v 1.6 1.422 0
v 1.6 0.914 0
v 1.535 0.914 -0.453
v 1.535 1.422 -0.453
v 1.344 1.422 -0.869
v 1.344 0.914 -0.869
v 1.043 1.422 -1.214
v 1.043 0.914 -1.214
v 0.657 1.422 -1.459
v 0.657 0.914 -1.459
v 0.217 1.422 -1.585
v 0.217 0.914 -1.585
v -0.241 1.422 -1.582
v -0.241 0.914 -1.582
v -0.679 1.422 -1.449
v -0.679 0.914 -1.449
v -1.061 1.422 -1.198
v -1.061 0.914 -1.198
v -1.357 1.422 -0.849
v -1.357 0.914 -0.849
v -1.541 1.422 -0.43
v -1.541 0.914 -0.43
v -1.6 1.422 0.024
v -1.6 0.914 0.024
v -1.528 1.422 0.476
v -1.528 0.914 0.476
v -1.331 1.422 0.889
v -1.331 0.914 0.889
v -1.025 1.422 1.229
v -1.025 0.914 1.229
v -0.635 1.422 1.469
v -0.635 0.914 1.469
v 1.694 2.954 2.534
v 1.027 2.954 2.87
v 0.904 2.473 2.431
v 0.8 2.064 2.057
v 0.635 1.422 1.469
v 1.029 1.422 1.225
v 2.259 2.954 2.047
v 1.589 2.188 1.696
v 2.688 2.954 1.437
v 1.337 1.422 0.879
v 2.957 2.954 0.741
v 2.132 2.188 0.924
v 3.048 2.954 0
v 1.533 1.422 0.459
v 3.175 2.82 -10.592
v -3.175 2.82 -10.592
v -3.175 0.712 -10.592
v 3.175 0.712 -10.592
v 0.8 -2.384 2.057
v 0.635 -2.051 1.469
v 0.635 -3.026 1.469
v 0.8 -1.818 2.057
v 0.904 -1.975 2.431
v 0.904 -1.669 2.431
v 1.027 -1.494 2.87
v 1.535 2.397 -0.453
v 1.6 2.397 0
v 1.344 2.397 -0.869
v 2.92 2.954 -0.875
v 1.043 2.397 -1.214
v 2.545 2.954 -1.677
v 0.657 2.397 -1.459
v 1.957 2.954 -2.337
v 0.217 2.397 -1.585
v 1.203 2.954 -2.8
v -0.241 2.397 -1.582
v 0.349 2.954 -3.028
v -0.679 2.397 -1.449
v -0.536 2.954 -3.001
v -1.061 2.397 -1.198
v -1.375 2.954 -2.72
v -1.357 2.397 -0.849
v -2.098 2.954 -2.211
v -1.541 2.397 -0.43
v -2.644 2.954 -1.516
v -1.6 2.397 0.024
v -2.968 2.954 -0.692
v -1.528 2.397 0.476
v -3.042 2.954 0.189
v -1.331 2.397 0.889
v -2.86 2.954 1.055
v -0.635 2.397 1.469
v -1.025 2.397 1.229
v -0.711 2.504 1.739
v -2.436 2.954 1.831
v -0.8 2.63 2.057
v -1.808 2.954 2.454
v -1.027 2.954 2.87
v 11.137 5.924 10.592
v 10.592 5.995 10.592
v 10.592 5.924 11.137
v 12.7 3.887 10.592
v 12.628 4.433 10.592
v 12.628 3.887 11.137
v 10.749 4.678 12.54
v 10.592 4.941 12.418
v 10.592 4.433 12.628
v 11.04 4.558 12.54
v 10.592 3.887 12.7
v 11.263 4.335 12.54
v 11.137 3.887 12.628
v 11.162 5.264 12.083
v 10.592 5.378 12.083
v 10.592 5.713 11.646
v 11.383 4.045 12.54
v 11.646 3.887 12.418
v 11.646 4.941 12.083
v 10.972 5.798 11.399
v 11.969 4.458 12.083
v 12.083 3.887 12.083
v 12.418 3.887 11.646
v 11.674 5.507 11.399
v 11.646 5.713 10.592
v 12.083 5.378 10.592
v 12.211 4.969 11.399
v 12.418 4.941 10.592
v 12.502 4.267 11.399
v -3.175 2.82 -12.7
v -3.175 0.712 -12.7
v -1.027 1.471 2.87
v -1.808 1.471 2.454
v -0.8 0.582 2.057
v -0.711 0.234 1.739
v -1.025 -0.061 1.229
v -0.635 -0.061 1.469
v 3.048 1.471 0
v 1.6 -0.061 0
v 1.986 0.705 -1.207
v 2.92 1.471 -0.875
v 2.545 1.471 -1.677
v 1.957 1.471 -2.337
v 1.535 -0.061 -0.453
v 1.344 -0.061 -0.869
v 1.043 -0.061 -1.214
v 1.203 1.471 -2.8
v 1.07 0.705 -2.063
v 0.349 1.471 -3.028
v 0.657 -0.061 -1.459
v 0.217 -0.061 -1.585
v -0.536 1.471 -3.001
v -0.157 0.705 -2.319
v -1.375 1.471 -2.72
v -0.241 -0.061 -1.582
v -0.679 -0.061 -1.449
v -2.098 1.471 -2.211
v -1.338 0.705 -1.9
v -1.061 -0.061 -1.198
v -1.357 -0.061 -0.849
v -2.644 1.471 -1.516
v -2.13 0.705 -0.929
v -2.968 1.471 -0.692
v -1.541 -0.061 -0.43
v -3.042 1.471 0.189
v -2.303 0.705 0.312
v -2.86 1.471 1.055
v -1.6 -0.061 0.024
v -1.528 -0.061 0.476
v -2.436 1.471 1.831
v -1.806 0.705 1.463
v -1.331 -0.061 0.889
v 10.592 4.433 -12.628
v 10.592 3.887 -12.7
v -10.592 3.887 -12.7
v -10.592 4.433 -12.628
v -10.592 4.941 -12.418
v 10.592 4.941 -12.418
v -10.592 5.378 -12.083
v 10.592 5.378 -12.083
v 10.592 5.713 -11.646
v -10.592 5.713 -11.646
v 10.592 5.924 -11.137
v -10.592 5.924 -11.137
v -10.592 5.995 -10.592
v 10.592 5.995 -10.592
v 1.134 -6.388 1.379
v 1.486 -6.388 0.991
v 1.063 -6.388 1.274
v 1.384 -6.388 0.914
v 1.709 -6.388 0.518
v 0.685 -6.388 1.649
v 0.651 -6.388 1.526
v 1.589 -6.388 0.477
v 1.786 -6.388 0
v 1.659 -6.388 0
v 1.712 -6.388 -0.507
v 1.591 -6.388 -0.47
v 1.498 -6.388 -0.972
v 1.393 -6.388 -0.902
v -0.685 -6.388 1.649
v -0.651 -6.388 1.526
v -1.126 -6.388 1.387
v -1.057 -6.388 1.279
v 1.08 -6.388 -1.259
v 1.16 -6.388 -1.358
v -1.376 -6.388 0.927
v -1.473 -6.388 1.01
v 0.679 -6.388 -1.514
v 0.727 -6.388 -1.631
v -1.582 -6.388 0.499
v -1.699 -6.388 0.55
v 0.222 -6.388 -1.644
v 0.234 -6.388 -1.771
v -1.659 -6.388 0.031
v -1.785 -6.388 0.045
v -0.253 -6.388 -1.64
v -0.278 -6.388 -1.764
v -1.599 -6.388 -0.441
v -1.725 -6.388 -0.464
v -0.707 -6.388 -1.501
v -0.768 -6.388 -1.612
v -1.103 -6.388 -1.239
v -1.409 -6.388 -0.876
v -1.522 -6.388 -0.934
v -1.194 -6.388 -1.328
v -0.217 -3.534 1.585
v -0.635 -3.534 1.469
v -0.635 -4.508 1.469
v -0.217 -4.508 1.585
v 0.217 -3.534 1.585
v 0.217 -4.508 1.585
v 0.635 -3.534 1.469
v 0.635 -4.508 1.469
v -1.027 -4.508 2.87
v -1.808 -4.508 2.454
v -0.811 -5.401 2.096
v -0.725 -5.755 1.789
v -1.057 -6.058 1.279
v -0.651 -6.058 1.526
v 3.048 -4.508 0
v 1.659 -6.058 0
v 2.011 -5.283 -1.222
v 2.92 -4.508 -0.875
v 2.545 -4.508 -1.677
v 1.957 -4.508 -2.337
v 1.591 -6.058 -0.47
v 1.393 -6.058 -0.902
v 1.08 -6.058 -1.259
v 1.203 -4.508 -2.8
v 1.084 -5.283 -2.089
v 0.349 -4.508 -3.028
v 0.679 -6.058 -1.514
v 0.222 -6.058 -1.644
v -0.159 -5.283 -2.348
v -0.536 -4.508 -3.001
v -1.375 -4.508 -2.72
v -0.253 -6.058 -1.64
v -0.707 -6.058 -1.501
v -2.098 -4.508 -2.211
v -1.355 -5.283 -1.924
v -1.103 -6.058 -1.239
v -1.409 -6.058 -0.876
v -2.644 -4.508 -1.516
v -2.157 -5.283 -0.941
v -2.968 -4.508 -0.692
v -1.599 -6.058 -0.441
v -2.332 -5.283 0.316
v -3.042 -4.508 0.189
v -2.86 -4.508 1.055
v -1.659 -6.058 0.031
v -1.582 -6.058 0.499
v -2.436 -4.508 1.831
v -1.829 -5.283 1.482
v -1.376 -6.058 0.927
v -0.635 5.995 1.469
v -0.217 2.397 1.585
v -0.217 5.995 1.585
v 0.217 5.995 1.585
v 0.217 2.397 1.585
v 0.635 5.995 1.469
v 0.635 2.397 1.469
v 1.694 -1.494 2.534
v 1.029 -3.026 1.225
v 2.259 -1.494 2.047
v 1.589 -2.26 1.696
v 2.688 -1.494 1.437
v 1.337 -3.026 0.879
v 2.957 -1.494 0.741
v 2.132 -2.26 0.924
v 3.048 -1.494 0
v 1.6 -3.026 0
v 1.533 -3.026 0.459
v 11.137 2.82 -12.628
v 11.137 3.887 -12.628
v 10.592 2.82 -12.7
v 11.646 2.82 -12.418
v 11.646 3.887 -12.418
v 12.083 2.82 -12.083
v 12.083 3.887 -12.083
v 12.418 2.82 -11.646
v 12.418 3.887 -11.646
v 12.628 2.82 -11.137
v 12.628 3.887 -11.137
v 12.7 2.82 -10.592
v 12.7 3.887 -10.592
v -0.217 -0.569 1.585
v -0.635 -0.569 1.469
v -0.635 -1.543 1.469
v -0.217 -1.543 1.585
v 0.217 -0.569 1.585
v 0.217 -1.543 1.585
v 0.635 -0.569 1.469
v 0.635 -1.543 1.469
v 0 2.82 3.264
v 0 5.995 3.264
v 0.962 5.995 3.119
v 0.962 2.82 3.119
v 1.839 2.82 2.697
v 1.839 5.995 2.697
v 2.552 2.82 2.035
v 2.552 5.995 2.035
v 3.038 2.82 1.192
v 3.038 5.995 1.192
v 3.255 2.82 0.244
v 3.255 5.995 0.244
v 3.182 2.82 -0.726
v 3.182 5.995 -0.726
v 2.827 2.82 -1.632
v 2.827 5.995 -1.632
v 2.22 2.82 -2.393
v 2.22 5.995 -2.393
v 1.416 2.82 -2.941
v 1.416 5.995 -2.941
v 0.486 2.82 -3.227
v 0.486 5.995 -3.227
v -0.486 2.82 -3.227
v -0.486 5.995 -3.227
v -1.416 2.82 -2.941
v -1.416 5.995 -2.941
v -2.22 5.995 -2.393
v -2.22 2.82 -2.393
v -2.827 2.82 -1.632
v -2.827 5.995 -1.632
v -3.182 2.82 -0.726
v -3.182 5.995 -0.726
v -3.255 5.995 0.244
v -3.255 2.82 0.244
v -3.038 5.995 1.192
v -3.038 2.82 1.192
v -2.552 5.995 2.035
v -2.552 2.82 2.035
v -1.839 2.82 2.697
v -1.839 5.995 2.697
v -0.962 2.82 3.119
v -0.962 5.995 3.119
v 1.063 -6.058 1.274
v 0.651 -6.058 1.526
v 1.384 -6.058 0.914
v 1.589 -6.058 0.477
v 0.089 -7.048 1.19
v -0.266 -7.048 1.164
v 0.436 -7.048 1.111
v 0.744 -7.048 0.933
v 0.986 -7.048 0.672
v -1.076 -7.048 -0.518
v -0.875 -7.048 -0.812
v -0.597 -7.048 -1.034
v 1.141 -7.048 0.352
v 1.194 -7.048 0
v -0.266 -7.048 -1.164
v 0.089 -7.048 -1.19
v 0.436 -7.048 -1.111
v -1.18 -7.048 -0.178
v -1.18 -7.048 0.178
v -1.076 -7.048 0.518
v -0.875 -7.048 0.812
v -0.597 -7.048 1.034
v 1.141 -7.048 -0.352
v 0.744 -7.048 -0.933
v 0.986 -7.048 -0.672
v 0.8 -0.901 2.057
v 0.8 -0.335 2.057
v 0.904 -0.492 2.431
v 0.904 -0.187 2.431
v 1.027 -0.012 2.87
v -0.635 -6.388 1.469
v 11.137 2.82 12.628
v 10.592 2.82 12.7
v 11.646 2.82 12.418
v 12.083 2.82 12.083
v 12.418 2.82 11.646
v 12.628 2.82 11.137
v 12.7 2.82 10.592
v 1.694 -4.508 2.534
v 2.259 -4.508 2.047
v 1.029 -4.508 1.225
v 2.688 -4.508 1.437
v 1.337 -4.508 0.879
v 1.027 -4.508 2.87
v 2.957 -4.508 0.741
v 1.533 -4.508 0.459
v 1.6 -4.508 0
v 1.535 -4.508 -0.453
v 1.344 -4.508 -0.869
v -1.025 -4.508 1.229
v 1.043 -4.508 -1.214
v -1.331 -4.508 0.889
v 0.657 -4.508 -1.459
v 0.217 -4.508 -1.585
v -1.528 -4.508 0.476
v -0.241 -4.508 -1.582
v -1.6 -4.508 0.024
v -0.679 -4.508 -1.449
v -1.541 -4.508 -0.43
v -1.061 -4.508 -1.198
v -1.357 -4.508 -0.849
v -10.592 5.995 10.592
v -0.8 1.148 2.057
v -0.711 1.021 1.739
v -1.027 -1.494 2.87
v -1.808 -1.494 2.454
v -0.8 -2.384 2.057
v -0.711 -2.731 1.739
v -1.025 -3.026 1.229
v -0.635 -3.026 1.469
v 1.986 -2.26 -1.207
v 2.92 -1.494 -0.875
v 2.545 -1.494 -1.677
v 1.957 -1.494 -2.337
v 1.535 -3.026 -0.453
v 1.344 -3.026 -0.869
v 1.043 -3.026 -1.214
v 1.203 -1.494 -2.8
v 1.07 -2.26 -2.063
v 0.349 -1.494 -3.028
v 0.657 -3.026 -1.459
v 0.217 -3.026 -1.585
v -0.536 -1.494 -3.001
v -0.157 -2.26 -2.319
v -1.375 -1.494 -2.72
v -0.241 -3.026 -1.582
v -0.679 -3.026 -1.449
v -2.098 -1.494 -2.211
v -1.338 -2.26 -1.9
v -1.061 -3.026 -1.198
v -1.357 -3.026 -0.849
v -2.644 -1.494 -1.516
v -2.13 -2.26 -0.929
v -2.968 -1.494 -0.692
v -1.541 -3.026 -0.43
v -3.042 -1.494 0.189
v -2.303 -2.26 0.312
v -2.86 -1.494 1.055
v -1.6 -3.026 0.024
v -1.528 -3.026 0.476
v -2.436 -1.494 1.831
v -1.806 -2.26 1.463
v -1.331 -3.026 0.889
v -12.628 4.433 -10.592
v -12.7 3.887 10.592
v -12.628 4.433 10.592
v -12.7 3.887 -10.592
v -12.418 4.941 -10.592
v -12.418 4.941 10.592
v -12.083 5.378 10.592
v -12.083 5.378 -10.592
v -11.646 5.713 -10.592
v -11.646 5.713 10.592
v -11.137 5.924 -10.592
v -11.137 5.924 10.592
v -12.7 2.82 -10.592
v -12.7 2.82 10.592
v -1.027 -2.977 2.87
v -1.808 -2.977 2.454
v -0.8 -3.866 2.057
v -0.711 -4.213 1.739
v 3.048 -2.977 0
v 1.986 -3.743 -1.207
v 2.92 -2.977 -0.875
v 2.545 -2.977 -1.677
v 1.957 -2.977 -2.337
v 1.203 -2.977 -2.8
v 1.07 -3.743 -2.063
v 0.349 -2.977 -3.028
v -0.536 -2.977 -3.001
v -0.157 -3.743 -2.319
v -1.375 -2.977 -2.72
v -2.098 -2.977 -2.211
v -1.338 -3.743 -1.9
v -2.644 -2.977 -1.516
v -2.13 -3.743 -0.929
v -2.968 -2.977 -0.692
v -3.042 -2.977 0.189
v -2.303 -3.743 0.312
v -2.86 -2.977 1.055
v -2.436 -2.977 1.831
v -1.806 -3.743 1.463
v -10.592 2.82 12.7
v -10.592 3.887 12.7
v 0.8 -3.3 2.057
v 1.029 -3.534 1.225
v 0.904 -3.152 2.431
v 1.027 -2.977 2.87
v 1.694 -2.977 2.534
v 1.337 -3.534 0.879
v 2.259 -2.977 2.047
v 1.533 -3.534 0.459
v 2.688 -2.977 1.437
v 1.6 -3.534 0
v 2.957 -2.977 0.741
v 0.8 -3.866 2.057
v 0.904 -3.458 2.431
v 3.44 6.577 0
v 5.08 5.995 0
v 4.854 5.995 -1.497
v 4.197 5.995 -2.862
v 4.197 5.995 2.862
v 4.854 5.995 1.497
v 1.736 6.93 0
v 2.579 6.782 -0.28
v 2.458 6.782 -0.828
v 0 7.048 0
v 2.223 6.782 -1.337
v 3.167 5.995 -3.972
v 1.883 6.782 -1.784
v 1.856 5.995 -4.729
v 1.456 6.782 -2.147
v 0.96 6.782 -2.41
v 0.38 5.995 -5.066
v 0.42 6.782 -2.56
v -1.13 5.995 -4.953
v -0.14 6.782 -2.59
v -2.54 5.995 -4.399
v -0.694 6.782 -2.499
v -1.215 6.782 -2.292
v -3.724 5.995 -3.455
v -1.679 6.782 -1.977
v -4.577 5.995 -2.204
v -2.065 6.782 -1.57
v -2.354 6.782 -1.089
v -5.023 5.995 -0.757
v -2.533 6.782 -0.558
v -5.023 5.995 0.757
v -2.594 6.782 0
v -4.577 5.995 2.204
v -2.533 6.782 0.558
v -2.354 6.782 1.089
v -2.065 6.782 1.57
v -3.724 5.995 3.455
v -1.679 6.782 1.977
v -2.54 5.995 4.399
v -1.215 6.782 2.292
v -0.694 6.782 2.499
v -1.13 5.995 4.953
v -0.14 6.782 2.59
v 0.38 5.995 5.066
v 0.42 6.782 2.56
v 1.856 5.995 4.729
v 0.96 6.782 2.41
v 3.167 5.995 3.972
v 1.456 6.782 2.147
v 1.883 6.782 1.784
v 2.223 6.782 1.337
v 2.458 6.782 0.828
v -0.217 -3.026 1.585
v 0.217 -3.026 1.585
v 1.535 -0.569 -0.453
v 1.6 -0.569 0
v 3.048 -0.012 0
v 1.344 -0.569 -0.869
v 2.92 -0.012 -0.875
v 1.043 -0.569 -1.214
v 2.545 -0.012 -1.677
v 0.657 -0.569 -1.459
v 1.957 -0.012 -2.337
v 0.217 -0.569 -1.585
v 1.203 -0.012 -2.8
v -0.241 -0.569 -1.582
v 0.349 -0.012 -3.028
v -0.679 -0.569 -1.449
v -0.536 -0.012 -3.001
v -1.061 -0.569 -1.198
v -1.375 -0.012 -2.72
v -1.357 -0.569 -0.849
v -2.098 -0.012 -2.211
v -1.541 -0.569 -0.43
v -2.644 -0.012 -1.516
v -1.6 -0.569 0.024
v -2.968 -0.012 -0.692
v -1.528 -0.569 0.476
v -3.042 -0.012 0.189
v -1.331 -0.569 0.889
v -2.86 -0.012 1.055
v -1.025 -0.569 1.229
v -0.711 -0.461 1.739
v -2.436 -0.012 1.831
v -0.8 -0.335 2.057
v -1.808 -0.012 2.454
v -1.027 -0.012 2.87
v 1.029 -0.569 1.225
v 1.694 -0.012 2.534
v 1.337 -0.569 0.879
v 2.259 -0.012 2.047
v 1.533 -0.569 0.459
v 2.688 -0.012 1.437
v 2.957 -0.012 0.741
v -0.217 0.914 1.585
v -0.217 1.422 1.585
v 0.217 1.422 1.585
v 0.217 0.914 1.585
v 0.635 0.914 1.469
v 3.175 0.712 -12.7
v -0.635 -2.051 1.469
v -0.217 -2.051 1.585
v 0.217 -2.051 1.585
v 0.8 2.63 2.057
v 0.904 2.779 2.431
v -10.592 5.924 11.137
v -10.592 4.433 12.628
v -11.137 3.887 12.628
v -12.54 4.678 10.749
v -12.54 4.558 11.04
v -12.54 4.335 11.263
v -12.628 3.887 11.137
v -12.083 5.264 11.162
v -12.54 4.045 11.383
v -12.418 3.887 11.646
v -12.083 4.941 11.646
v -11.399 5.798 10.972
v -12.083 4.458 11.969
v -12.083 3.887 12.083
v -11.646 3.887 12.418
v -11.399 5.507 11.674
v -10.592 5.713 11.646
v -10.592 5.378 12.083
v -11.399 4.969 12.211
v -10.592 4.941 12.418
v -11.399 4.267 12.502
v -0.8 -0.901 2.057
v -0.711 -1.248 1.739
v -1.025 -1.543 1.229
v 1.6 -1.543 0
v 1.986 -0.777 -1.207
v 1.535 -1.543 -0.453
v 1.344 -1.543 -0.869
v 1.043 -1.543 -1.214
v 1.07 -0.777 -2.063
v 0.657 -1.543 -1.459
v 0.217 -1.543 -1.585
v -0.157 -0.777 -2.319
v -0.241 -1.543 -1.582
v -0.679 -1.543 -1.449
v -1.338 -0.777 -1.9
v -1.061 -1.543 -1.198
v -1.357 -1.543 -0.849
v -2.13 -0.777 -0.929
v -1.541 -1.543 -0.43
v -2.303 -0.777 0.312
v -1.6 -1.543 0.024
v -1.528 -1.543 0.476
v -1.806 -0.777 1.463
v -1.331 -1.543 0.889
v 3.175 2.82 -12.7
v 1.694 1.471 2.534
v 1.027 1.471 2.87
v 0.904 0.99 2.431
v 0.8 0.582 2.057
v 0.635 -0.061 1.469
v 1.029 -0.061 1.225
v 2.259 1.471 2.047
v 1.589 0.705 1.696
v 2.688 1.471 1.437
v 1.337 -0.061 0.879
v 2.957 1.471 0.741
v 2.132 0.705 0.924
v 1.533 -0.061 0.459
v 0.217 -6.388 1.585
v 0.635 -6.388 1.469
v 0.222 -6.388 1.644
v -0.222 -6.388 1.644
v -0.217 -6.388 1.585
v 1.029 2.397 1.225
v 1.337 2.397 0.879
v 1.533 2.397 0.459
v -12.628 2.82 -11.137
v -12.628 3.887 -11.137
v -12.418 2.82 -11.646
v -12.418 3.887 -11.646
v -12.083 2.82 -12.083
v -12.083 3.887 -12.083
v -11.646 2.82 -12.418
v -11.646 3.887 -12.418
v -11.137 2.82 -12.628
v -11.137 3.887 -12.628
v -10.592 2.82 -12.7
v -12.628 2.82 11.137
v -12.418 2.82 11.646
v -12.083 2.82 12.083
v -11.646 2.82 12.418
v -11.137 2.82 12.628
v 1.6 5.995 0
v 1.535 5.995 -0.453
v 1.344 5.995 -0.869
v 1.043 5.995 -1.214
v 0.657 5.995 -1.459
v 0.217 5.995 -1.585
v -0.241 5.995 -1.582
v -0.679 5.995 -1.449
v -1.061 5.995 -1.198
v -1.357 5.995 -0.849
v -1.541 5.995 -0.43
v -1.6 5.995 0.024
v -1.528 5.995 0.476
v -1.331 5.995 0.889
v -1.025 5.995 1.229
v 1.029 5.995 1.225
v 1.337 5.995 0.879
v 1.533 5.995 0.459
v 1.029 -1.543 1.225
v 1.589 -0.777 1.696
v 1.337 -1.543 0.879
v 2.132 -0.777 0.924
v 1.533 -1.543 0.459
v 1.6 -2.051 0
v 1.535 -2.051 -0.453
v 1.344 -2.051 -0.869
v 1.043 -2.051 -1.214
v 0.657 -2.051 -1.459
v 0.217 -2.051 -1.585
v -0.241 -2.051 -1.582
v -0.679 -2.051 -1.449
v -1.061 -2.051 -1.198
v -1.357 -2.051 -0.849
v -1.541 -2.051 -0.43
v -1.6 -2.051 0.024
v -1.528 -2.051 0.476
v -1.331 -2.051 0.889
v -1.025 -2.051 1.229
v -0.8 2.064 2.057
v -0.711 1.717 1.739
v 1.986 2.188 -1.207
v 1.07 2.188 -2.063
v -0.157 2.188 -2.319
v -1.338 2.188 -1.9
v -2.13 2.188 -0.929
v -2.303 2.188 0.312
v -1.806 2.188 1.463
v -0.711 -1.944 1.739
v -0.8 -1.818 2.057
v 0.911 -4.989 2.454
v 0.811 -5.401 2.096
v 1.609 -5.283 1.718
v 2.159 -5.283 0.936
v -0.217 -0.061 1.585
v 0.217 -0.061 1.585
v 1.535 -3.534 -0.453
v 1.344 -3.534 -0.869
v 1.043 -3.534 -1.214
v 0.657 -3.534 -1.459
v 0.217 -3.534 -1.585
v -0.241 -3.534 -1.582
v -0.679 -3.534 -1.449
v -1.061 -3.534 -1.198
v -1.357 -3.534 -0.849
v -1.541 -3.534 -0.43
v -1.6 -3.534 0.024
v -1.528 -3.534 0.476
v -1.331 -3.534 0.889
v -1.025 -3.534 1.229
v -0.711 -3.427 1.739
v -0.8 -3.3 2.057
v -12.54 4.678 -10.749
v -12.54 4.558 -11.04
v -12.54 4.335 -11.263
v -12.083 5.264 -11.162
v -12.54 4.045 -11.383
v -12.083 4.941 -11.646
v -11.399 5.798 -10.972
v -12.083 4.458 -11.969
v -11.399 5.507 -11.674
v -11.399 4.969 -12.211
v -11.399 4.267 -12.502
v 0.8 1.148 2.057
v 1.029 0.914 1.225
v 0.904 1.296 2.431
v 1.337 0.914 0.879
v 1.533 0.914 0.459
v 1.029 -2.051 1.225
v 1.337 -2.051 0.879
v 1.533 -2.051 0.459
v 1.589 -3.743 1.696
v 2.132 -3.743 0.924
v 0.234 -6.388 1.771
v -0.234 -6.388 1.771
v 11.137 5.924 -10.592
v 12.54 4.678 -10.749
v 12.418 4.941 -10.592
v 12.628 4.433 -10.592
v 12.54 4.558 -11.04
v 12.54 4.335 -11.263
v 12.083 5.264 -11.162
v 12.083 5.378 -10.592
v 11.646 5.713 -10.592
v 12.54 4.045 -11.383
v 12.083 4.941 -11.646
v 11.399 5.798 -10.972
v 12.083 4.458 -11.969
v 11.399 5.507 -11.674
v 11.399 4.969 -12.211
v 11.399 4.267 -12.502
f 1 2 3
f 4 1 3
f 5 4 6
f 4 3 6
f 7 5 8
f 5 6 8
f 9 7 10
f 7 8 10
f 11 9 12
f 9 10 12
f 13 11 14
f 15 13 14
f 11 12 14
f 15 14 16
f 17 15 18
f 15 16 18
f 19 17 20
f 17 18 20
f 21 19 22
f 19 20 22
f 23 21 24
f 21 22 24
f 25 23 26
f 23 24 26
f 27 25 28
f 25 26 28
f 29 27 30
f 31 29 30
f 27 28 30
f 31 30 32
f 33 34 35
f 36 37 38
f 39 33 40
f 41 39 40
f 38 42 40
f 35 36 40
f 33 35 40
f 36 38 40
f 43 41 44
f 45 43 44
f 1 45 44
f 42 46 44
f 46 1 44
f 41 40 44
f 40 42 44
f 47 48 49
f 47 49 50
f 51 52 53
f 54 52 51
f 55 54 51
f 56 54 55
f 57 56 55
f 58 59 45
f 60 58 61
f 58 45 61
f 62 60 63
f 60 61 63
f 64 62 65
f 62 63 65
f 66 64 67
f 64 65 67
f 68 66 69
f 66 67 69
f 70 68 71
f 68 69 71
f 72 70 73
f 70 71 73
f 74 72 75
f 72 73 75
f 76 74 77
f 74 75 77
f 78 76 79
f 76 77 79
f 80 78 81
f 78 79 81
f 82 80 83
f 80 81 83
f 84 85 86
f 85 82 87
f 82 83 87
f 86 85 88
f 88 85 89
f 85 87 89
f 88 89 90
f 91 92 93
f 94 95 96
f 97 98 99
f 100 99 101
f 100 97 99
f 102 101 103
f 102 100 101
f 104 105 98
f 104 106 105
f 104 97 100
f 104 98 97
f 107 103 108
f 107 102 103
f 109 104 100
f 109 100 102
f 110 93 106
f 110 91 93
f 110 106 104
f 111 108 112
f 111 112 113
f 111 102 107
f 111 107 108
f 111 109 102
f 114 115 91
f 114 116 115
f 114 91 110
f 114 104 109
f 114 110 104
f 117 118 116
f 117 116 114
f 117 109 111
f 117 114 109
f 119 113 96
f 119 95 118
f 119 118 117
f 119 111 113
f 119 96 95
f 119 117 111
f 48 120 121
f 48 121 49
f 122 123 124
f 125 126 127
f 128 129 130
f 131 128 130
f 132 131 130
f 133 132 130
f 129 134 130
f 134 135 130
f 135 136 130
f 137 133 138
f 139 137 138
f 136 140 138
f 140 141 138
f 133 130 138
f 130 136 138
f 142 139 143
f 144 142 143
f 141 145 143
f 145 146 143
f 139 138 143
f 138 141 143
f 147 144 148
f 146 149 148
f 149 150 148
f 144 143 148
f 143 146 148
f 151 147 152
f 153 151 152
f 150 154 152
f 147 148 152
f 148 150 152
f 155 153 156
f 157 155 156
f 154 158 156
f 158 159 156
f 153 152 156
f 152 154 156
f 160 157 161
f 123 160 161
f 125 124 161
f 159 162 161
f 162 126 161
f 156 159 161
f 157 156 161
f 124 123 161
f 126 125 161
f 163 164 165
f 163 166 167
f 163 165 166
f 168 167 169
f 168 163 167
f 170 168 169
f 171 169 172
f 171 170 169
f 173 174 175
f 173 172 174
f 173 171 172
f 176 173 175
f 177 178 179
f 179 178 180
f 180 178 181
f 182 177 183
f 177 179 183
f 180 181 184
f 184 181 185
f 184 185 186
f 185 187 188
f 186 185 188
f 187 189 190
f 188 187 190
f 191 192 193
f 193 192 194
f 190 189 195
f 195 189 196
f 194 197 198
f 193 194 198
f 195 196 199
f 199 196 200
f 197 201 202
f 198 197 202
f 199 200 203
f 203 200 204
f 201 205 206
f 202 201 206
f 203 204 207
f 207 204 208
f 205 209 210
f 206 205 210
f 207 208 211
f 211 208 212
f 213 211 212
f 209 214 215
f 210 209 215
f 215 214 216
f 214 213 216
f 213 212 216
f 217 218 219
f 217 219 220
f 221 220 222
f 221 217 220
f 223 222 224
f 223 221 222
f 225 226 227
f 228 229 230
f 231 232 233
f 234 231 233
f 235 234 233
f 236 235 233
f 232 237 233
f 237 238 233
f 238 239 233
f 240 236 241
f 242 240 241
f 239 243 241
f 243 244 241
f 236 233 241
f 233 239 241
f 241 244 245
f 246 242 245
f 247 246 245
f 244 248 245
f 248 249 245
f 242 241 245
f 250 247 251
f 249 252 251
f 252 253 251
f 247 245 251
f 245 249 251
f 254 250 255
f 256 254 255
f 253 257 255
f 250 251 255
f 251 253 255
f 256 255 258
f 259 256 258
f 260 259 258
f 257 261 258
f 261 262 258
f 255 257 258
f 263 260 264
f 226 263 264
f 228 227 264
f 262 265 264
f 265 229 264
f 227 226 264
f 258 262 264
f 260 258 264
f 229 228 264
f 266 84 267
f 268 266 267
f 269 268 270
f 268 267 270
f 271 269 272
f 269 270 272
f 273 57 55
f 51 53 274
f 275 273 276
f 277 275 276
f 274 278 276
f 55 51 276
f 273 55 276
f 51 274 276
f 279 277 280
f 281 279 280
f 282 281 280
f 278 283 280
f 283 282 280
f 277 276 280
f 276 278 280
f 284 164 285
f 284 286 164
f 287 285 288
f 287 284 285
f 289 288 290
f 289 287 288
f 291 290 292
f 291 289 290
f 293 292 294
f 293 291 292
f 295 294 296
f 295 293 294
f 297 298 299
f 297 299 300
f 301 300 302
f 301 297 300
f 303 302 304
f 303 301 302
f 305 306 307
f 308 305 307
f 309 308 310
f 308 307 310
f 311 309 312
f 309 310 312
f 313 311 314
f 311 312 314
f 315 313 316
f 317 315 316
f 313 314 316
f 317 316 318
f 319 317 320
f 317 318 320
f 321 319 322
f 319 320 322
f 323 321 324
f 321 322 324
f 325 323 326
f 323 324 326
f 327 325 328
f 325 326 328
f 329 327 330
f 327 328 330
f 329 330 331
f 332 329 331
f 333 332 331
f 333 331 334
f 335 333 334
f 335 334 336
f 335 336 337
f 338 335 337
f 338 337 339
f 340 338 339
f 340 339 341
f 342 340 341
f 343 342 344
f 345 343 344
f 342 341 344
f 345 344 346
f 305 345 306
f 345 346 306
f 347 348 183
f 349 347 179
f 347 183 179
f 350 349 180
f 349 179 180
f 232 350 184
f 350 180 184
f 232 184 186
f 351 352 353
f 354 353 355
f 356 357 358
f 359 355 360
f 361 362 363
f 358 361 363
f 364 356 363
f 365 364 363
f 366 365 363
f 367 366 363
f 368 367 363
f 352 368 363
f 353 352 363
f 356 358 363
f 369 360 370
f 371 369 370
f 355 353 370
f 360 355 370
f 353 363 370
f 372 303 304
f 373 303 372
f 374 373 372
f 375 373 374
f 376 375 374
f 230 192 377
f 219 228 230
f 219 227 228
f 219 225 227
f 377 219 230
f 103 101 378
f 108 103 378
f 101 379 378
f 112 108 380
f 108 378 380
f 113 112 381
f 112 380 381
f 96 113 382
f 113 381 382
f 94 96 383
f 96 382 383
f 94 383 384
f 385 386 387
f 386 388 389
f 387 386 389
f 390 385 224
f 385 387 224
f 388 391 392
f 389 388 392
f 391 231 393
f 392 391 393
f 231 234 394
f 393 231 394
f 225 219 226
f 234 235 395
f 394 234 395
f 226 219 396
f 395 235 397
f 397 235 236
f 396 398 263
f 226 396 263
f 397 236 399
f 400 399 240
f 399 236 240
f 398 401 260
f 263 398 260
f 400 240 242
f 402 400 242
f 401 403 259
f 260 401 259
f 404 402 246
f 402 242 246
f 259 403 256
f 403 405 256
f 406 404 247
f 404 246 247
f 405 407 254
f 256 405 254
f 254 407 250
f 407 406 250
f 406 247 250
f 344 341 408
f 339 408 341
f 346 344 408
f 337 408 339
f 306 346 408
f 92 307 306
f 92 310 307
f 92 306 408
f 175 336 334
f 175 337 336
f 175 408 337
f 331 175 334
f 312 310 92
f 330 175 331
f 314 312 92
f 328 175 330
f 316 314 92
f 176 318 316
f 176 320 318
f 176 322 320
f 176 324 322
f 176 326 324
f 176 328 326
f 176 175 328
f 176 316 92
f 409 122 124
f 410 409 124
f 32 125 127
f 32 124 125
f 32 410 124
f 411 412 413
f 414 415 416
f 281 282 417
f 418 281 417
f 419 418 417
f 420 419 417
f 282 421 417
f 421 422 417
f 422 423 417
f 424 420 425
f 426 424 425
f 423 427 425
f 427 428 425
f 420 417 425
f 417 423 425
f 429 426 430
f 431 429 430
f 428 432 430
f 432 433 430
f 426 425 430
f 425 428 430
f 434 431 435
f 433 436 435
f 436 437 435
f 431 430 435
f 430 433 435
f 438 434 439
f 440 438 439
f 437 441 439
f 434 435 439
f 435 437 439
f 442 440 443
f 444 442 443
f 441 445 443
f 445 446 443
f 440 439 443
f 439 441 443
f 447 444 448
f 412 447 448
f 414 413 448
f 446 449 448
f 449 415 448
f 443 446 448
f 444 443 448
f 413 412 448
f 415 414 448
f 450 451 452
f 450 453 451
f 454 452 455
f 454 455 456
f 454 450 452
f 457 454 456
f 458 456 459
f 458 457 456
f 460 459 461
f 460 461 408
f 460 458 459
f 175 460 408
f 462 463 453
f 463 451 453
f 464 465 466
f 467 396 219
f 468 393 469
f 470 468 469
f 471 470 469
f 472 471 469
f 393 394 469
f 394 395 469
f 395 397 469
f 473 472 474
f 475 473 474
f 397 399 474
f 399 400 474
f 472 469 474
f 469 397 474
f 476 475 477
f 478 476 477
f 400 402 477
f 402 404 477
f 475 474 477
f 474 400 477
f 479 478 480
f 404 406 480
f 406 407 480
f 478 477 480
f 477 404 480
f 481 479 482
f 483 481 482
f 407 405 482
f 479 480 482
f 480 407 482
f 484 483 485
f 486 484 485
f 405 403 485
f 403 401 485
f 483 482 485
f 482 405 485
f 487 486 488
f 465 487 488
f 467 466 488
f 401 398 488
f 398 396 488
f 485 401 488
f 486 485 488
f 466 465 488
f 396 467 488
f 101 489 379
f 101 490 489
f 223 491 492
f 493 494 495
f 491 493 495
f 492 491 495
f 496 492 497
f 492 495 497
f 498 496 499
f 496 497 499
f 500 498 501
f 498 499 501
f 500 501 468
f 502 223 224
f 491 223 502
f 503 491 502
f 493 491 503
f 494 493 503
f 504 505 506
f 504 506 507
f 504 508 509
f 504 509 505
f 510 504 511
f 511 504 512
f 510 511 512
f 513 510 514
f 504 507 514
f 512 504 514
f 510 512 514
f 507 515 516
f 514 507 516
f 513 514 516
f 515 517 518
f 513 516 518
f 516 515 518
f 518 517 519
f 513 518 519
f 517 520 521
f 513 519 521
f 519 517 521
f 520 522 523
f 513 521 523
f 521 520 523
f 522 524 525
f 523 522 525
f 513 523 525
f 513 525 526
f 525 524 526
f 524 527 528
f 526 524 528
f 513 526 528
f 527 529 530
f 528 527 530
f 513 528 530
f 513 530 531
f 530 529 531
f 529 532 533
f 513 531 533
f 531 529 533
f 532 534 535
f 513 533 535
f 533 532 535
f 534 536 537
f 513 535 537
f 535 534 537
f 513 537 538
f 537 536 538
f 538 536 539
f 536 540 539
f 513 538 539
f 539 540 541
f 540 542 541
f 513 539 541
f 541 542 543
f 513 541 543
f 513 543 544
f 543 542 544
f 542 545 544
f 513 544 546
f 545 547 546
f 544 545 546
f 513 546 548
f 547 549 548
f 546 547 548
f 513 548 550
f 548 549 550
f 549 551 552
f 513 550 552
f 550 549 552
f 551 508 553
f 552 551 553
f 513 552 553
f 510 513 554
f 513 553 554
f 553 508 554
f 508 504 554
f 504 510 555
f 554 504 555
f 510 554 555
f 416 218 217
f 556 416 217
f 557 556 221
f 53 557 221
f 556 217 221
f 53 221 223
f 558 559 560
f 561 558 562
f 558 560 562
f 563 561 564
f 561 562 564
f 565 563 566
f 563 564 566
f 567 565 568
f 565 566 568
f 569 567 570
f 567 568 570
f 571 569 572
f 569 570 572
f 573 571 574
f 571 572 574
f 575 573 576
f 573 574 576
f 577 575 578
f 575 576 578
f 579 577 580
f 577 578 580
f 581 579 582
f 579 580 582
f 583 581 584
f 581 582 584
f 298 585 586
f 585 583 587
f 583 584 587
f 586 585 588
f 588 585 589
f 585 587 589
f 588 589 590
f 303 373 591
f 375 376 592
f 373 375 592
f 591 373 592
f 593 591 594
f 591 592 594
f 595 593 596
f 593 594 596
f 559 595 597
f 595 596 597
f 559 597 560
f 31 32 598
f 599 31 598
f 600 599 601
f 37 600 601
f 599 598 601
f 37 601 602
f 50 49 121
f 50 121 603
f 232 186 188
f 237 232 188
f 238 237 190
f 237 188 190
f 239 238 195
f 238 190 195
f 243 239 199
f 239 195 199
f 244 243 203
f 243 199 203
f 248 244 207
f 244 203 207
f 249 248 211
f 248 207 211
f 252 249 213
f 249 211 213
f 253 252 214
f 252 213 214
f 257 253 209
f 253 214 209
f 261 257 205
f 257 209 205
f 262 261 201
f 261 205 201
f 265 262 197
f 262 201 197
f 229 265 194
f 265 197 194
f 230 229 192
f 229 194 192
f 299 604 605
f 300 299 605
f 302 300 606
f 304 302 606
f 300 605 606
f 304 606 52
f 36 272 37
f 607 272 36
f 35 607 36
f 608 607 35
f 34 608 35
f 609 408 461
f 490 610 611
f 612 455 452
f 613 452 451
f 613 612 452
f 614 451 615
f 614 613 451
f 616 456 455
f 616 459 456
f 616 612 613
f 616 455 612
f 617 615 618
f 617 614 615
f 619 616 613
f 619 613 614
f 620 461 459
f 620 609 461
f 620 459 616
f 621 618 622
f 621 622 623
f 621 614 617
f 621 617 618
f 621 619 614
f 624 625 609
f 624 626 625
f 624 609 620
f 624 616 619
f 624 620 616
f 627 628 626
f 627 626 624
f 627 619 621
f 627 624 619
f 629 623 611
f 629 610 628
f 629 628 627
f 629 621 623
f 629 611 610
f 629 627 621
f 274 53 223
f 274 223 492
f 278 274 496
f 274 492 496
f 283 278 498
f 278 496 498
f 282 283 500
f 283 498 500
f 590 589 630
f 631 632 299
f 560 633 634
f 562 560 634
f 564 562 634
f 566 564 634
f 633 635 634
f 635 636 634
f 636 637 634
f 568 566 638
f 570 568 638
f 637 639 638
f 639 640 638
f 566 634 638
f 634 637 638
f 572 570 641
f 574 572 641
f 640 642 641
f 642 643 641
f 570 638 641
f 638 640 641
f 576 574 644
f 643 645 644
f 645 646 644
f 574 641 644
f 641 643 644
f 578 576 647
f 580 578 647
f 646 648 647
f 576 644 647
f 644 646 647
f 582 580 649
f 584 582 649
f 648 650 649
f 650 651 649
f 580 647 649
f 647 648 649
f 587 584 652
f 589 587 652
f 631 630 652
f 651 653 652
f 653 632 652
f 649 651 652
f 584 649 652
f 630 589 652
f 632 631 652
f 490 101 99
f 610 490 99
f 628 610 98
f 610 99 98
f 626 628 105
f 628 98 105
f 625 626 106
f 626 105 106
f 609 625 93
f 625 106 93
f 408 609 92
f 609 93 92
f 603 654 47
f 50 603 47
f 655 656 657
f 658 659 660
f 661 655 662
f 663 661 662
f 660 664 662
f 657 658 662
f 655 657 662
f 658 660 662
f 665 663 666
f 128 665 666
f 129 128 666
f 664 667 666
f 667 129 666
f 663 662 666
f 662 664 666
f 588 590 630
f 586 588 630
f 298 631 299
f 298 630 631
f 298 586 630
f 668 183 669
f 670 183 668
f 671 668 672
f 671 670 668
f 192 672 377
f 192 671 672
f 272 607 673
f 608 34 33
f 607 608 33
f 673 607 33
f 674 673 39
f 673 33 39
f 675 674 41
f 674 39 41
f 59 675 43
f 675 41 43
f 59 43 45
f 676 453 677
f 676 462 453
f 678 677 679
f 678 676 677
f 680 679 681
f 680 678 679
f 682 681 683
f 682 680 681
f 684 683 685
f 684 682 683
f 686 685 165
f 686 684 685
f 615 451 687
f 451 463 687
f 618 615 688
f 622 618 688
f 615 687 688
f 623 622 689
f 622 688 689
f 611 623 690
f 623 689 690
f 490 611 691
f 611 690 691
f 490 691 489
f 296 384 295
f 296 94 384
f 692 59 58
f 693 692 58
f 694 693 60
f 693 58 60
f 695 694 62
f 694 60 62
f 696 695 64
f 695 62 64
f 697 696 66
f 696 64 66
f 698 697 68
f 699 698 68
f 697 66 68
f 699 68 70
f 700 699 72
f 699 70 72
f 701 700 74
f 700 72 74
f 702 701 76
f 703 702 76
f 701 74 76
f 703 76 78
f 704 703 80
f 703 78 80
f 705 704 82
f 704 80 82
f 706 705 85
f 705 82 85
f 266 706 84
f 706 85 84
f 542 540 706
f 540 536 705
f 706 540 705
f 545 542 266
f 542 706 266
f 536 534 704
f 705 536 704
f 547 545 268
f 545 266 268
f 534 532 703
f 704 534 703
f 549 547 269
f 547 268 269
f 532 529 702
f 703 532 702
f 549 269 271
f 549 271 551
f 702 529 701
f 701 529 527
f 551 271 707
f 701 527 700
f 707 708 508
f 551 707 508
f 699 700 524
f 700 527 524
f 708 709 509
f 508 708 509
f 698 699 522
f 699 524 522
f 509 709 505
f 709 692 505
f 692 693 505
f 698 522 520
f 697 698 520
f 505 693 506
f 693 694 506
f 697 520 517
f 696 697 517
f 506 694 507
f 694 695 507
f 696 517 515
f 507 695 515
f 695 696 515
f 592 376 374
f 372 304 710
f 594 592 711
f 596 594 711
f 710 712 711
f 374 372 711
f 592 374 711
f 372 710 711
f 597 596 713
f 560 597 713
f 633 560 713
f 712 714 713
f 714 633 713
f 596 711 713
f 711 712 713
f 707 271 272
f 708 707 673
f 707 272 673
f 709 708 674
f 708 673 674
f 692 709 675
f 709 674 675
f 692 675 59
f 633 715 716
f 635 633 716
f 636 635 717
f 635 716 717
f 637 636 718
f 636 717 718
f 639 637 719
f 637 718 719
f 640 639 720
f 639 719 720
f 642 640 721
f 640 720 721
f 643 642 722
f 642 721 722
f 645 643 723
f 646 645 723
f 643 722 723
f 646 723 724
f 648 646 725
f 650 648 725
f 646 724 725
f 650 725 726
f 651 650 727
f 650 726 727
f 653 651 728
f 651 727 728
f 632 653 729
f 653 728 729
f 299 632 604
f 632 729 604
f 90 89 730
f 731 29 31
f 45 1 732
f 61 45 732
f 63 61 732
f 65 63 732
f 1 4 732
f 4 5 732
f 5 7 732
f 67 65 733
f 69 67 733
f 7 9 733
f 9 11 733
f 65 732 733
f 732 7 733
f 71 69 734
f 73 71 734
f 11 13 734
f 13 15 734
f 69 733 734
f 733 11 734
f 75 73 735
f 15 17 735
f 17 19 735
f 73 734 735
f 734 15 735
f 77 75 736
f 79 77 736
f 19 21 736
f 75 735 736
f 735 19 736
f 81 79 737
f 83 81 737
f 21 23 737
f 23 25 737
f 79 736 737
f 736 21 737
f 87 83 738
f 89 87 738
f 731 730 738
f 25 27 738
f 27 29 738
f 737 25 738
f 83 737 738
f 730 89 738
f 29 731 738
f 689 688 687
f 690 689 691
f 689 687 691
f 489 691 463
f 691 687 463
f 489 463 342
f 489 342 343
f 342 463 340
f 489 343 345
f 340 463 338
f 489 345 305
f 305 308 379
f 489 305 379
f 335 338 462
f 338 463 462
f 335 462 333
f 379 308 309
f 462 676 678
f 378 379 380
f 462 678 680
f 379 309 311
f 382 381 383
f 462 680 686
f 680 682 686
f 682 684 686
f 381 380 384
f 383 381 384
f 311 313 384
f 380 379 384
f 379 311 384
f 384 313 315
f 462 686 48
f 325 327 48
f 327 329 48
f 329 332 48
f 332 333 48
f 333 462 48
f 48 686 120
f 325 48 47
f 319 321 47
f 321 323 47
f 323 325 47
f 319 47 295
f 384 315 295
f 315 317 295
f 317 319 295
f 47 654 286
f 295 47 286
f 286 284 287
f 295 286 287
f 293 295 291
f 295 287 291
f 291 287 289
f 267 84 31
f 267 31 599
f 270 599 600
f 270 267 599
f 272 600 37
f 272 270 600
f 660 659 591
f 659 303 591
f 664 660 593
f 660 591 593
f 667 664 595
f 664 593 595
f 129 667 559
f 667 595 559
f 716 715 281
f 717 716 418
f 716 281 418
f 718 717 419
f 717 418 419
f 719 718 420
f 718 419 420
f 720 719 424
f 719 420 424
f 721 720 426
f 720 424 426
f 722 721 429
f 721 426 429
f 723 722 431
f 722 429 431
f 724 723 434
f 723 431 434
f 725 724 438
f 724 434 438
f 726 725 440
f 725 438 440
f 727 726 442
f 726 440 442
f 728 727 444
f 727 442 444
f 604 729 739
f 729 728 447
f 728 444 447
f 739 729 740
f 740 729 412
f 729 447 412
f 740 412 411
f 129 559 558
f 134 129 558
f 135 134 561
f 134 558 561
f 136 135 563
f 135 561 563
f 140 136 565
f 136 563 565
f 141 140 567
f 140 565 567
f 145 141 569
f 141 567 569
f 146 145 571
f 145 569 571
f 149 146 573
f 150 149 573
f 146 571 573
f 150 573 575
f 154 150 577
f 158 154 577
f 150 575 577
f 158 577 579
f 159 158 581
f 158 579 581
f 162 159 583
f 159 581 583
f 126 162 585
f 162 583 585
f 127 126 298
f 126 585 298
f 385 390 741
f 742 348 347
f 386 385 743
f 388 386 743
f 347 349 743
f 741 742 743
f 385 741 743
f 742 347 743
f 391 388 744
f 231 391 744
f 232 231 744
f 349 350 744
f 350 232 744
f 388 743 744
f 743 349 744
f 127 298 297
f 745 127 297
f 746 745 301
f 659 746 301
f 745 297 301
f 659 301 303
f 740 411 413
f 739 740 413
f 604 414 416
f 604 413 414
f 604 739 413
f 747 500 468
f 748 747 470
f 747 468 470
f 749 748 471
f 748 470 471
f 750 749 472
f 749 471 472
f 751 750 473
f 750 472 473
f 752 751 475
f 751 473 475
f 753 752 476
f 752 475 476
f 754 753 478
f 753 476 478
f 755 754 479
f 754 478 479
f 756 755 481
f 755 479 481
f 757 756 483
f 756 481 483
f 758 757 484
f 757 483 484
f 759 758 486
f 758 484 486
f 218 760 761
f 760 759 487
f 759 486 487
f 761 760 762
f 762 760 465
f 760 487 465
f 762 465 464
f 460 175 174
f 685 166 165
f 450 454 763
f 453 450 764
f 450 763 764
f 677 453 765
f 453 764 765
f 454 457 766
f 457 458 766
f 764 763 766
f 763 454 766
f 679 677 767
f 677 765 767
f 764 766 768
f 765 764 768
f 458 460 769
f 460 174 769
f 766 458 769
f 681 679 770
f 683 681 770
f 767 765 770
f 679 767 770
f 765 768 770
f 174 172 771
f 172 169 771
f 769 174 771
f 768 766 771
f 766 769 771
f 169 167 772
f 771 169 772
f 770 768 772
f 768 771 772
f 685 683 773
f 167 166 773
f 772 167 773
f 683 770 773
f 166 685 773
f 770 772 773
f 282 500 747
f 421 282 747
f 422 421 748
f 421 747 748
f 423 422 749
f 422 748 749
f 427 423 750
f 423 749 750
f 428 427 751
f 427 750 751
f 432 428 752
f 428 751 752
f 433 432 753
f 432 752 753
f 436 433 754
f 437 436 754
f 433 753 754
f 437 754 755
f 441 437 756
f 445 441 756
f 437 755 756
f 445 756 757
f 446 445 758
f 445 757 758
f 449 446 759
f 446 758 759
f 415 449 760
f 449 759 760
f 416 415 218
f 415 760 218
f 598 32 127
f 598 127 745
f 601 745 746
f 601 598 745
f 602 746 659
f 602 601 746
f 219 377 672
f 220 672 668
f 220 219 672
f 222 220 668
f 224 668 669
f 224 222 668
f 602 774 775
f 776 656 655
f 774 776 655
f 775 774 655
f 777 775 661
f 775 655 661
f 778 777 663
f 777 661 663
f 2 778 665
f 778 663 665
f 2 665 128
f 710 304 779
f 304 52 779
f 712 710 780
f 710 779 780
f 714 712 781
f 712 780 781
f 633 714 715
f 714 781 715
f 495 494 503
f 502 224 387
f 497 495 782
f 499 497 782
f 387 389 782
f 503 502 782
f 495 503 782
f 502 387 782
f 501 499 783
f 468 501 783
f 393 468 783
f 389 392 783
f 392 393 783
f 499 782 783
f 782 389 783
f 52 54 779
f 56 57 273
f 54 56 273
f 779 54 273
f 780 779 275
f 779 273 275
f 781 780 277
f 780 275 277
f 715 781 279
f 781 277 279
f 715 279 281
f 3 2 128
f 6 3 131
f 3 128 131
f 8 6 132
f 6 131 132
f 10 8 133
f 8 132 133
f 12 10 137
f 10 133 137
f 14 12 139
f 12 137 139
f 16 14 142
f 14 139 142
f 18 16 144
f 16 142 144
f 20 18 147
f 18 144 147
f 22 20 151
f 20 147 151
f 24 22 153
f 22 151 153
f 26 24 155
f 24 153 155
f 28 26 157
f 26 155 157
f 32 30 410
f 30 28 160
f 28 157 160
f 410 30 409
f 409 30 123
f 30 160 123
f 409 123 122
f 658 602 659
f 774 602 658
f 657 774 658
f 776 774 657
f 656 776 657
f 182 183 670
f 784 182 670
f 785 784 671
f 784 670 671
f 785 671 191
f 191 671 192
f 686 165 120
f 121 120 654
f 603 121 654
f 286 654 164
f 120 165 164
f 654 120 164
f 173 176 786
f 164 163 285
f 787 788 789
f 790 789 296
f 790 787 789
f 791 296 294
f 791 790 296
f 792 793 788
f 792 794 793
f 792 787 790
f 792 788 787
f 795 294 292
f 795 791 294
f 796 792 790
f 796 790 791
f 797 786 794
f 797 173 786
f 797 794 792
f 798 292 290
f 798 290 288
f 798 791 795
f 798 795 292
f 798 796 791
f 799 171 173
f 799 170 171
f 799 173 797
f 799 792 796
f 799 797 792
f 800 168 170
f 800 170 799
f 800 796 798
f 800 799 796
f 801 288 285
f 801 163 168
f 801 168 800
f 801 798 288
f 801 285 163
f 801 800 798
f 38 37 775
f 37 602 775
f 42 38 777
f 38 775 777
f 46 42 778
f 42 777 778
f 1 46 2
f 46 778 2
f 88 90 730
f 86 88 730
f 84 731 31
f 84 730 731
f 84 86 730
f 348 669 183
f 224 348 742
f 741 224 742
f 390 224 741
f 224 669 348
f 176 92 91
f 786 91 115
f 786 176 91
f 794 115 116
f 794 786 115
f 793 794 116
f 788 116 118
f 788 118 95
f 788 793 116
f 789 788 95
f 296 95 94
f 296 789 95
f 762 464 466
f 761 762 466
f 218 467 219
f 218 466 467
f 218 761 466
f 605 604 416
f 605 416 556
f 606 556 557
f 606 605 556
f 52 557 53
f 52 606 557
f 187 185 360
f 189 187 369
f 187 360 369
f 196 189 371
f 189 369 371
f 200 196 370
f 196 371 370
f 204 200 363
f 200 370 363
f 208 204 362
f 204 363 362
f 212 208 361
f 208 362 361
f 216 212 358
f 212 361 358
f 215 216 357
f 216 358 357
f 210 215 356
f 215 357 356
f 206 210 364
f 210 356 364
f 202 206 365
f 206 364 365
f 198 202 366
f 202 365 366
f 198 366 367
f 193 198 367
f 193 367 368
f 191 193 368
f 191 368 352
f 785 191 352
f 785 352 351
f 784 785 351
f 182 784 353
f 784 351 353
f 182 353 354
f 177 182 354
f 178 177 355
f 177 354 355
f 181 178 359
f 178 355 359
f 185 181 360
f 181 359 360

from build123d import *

# Parameters (mm, degrees)
BOSS_EXTRUDE1_START = 5.995416
SKETCH3_W           = 25.4
SKETCH3_H           = 25.4
SKETCH3_R           = 3.2639
BOSS_EXTRUDE1_DEPTH = 3.175
SKETCH4_W           = 6.35
SKETCH4_H           = 2.1082
BOSS_EXTRUDE2_DEPTH = 2.1082
FILLET1_R           = 2.1082
CUT_EXTRUDE1_REACH  = 24.197


with BuildPart() as part:
    # Sketch3 → Boss-Extrude1 (new body)
    with BuildSketch(Plane(origin=(0, 0, 0), x_dir=(1, 0, 0), z_dir=(0, 1, 0)).offset(BOSS_EXTRUDE1_START)):
        Rectangle(SKETCH3_W, SKETCH3_H)
        with Locations(Location((0, 0, 0), (0, 0, 270))):
            Circle(SKETCH3_R, mode=Mode.SUBTRACT)
    extrude(amount=-BOSS_EXTRUDE1_DEPTH)

    # Sketch4 → Boss-Extrude2 (add)
    with BuildSketch(Plane.XZ.offset(-2.820416)):
        with Locations((0, -11.6459)):
            Rectangle(SKETCH4_W, SKETCH4_H)
    extrude(amount=BOSS_EXTRUDE2_DEPTH)

    # Fillet1
    fillet1_edges = [part.edges().sort_by_distance(p)[0] for p in [
        (0, 5.995416, -12.7),
        (12.7, 5.995416, 0),
        (0, 5.995416, 12.7),
        (-12.7, 5.995416, 0),
        (-12.7, 4.407916, -12.7),
        (12.7, 4.407916, -12.7),
        (12.7, 4.407916, 12.7),
        (-12.7, 4.407916, 12.7),
    ]]
    fillet(fillet1_edges, radius=FILLET1_R)


with BuildPart() as body_2:
    # Sketch5 → Revolve1 (revolve)
    with BuildSketch(Plane.XY, mode=Mode.PRIVATE) as revolve1_sk:
        with BuildLine():
            Line((-5.08, 5.995416), (-1.6002, 5.995416))
            Line((-1.6002, 5.995416), (-1.6002, 2.396612882))
            Line((-1.6002, 2.396612882), (-3.048, 2.953531234))
            Line((-3.048, 2.953531234), (-1.6002, 1.421990306))
            Line((-1.6002, 1.421990306), (-1.6002, 0.913990306))
            Line((-1.6002, 0.913990306), (-3.048, 1.470908658))
            Line((-3.048, 1.470908658), (-1.6002, -0.060632271))
            Line((-1.6002, -0.060632271), (-1.6002, -0.568632271))
            Line((-1.6002, -0.568632271), (-3.048, -0.011713918))
            Line((-3.048, -0.011713918), (-1.6002, -1.543254847))
            Line((-1.6002, -1.543254847), (-1.6002, -2.051254847))
            Line((-1.6002, -2.051254847), (-3.048, -1.494336495))
            Line((-3.048, -1.494336495), (-1.6002, -3.025877424))
            Line((-1.6002, -3.025877424), (-1.6002, -3.533877424))
            Line((-1.6002, -3.533877424), (-3.048, -2.976959071))
            Line((-3.048, -2.976959071), (-1.6002, -4.5085))
            Line((-1.6002, -4.5085), (-3.048, -4.5085))
            Line((-3.048, -4.5085), (-1.658882759, -6.0579))
            Line((-1.658882759, -6.0579), (-1.658882759, -6.3881))
            Line((-1.658882759, -6.3881), (-1.785882759, -6.3881))
            Line((-1.785882759, -6.3881), (-1.1938, -7.0485))
            Line((-1.1938, -7.0485), (0, -7.0485))
            Line((0, -7.0485), (0, 7.0485))
            ThreePointArc((0, 7.0485), (-2.59400202, 6.782459783), (-5.08, 5.995416))
        make_face()
    revolve(revolve1_sk.sketch.rotate(Axis((0, -7.0485, 0), (0, 1, 0)), 180), axis=Axis((0, -7.0485, 0), (0, 1, 0)))

    # Cut-Extrude1: up to this face of the body (flat: up to its plane)
    cut_extrude1_end = Plane(body_2.part.faces().sort_by_distance((-1.709395151, -6.3881, 0))[0])
    # Sketch6 → Cut-Extrude1 (cut, up to the picked face)
    with BuildSketch(Plane.XZ.offset(-5.995416), mode=Mode.PRIVATE) as cut_extrude1_sk1:
        with BuildLine():
            Line((1.646319191, 5.08), (-1.646319191, 5.08))
            Line((-1.646319191, 5.08), (-0.635, 1.468814161))
            ThreePointArc((-0.635, 1.468814161), (0, 1.6002), (0.635, 1.468814161))
            Line((0.635, 1.468814161), (1.646319191, 5.08))
        make_face()
    cut_extrude1_tool1 = split(extrude(cut_extrude1_sk1.sketch, amount=CUT_EXTRUDE1_REACH, mode=Mode.PRIVATE), bisect_by=cut_extrude1_end, keep=Keep.BOTH, mode=Mode.PRIVATE)
    add(cut_extrude1_tool1.solids().sort_by(Axis((0, 5.995416, 3.569099), (0, -1, 0)))[0], mode=Mode.SUBTRACT)


solid = Compound([part.part, body_2.part])
